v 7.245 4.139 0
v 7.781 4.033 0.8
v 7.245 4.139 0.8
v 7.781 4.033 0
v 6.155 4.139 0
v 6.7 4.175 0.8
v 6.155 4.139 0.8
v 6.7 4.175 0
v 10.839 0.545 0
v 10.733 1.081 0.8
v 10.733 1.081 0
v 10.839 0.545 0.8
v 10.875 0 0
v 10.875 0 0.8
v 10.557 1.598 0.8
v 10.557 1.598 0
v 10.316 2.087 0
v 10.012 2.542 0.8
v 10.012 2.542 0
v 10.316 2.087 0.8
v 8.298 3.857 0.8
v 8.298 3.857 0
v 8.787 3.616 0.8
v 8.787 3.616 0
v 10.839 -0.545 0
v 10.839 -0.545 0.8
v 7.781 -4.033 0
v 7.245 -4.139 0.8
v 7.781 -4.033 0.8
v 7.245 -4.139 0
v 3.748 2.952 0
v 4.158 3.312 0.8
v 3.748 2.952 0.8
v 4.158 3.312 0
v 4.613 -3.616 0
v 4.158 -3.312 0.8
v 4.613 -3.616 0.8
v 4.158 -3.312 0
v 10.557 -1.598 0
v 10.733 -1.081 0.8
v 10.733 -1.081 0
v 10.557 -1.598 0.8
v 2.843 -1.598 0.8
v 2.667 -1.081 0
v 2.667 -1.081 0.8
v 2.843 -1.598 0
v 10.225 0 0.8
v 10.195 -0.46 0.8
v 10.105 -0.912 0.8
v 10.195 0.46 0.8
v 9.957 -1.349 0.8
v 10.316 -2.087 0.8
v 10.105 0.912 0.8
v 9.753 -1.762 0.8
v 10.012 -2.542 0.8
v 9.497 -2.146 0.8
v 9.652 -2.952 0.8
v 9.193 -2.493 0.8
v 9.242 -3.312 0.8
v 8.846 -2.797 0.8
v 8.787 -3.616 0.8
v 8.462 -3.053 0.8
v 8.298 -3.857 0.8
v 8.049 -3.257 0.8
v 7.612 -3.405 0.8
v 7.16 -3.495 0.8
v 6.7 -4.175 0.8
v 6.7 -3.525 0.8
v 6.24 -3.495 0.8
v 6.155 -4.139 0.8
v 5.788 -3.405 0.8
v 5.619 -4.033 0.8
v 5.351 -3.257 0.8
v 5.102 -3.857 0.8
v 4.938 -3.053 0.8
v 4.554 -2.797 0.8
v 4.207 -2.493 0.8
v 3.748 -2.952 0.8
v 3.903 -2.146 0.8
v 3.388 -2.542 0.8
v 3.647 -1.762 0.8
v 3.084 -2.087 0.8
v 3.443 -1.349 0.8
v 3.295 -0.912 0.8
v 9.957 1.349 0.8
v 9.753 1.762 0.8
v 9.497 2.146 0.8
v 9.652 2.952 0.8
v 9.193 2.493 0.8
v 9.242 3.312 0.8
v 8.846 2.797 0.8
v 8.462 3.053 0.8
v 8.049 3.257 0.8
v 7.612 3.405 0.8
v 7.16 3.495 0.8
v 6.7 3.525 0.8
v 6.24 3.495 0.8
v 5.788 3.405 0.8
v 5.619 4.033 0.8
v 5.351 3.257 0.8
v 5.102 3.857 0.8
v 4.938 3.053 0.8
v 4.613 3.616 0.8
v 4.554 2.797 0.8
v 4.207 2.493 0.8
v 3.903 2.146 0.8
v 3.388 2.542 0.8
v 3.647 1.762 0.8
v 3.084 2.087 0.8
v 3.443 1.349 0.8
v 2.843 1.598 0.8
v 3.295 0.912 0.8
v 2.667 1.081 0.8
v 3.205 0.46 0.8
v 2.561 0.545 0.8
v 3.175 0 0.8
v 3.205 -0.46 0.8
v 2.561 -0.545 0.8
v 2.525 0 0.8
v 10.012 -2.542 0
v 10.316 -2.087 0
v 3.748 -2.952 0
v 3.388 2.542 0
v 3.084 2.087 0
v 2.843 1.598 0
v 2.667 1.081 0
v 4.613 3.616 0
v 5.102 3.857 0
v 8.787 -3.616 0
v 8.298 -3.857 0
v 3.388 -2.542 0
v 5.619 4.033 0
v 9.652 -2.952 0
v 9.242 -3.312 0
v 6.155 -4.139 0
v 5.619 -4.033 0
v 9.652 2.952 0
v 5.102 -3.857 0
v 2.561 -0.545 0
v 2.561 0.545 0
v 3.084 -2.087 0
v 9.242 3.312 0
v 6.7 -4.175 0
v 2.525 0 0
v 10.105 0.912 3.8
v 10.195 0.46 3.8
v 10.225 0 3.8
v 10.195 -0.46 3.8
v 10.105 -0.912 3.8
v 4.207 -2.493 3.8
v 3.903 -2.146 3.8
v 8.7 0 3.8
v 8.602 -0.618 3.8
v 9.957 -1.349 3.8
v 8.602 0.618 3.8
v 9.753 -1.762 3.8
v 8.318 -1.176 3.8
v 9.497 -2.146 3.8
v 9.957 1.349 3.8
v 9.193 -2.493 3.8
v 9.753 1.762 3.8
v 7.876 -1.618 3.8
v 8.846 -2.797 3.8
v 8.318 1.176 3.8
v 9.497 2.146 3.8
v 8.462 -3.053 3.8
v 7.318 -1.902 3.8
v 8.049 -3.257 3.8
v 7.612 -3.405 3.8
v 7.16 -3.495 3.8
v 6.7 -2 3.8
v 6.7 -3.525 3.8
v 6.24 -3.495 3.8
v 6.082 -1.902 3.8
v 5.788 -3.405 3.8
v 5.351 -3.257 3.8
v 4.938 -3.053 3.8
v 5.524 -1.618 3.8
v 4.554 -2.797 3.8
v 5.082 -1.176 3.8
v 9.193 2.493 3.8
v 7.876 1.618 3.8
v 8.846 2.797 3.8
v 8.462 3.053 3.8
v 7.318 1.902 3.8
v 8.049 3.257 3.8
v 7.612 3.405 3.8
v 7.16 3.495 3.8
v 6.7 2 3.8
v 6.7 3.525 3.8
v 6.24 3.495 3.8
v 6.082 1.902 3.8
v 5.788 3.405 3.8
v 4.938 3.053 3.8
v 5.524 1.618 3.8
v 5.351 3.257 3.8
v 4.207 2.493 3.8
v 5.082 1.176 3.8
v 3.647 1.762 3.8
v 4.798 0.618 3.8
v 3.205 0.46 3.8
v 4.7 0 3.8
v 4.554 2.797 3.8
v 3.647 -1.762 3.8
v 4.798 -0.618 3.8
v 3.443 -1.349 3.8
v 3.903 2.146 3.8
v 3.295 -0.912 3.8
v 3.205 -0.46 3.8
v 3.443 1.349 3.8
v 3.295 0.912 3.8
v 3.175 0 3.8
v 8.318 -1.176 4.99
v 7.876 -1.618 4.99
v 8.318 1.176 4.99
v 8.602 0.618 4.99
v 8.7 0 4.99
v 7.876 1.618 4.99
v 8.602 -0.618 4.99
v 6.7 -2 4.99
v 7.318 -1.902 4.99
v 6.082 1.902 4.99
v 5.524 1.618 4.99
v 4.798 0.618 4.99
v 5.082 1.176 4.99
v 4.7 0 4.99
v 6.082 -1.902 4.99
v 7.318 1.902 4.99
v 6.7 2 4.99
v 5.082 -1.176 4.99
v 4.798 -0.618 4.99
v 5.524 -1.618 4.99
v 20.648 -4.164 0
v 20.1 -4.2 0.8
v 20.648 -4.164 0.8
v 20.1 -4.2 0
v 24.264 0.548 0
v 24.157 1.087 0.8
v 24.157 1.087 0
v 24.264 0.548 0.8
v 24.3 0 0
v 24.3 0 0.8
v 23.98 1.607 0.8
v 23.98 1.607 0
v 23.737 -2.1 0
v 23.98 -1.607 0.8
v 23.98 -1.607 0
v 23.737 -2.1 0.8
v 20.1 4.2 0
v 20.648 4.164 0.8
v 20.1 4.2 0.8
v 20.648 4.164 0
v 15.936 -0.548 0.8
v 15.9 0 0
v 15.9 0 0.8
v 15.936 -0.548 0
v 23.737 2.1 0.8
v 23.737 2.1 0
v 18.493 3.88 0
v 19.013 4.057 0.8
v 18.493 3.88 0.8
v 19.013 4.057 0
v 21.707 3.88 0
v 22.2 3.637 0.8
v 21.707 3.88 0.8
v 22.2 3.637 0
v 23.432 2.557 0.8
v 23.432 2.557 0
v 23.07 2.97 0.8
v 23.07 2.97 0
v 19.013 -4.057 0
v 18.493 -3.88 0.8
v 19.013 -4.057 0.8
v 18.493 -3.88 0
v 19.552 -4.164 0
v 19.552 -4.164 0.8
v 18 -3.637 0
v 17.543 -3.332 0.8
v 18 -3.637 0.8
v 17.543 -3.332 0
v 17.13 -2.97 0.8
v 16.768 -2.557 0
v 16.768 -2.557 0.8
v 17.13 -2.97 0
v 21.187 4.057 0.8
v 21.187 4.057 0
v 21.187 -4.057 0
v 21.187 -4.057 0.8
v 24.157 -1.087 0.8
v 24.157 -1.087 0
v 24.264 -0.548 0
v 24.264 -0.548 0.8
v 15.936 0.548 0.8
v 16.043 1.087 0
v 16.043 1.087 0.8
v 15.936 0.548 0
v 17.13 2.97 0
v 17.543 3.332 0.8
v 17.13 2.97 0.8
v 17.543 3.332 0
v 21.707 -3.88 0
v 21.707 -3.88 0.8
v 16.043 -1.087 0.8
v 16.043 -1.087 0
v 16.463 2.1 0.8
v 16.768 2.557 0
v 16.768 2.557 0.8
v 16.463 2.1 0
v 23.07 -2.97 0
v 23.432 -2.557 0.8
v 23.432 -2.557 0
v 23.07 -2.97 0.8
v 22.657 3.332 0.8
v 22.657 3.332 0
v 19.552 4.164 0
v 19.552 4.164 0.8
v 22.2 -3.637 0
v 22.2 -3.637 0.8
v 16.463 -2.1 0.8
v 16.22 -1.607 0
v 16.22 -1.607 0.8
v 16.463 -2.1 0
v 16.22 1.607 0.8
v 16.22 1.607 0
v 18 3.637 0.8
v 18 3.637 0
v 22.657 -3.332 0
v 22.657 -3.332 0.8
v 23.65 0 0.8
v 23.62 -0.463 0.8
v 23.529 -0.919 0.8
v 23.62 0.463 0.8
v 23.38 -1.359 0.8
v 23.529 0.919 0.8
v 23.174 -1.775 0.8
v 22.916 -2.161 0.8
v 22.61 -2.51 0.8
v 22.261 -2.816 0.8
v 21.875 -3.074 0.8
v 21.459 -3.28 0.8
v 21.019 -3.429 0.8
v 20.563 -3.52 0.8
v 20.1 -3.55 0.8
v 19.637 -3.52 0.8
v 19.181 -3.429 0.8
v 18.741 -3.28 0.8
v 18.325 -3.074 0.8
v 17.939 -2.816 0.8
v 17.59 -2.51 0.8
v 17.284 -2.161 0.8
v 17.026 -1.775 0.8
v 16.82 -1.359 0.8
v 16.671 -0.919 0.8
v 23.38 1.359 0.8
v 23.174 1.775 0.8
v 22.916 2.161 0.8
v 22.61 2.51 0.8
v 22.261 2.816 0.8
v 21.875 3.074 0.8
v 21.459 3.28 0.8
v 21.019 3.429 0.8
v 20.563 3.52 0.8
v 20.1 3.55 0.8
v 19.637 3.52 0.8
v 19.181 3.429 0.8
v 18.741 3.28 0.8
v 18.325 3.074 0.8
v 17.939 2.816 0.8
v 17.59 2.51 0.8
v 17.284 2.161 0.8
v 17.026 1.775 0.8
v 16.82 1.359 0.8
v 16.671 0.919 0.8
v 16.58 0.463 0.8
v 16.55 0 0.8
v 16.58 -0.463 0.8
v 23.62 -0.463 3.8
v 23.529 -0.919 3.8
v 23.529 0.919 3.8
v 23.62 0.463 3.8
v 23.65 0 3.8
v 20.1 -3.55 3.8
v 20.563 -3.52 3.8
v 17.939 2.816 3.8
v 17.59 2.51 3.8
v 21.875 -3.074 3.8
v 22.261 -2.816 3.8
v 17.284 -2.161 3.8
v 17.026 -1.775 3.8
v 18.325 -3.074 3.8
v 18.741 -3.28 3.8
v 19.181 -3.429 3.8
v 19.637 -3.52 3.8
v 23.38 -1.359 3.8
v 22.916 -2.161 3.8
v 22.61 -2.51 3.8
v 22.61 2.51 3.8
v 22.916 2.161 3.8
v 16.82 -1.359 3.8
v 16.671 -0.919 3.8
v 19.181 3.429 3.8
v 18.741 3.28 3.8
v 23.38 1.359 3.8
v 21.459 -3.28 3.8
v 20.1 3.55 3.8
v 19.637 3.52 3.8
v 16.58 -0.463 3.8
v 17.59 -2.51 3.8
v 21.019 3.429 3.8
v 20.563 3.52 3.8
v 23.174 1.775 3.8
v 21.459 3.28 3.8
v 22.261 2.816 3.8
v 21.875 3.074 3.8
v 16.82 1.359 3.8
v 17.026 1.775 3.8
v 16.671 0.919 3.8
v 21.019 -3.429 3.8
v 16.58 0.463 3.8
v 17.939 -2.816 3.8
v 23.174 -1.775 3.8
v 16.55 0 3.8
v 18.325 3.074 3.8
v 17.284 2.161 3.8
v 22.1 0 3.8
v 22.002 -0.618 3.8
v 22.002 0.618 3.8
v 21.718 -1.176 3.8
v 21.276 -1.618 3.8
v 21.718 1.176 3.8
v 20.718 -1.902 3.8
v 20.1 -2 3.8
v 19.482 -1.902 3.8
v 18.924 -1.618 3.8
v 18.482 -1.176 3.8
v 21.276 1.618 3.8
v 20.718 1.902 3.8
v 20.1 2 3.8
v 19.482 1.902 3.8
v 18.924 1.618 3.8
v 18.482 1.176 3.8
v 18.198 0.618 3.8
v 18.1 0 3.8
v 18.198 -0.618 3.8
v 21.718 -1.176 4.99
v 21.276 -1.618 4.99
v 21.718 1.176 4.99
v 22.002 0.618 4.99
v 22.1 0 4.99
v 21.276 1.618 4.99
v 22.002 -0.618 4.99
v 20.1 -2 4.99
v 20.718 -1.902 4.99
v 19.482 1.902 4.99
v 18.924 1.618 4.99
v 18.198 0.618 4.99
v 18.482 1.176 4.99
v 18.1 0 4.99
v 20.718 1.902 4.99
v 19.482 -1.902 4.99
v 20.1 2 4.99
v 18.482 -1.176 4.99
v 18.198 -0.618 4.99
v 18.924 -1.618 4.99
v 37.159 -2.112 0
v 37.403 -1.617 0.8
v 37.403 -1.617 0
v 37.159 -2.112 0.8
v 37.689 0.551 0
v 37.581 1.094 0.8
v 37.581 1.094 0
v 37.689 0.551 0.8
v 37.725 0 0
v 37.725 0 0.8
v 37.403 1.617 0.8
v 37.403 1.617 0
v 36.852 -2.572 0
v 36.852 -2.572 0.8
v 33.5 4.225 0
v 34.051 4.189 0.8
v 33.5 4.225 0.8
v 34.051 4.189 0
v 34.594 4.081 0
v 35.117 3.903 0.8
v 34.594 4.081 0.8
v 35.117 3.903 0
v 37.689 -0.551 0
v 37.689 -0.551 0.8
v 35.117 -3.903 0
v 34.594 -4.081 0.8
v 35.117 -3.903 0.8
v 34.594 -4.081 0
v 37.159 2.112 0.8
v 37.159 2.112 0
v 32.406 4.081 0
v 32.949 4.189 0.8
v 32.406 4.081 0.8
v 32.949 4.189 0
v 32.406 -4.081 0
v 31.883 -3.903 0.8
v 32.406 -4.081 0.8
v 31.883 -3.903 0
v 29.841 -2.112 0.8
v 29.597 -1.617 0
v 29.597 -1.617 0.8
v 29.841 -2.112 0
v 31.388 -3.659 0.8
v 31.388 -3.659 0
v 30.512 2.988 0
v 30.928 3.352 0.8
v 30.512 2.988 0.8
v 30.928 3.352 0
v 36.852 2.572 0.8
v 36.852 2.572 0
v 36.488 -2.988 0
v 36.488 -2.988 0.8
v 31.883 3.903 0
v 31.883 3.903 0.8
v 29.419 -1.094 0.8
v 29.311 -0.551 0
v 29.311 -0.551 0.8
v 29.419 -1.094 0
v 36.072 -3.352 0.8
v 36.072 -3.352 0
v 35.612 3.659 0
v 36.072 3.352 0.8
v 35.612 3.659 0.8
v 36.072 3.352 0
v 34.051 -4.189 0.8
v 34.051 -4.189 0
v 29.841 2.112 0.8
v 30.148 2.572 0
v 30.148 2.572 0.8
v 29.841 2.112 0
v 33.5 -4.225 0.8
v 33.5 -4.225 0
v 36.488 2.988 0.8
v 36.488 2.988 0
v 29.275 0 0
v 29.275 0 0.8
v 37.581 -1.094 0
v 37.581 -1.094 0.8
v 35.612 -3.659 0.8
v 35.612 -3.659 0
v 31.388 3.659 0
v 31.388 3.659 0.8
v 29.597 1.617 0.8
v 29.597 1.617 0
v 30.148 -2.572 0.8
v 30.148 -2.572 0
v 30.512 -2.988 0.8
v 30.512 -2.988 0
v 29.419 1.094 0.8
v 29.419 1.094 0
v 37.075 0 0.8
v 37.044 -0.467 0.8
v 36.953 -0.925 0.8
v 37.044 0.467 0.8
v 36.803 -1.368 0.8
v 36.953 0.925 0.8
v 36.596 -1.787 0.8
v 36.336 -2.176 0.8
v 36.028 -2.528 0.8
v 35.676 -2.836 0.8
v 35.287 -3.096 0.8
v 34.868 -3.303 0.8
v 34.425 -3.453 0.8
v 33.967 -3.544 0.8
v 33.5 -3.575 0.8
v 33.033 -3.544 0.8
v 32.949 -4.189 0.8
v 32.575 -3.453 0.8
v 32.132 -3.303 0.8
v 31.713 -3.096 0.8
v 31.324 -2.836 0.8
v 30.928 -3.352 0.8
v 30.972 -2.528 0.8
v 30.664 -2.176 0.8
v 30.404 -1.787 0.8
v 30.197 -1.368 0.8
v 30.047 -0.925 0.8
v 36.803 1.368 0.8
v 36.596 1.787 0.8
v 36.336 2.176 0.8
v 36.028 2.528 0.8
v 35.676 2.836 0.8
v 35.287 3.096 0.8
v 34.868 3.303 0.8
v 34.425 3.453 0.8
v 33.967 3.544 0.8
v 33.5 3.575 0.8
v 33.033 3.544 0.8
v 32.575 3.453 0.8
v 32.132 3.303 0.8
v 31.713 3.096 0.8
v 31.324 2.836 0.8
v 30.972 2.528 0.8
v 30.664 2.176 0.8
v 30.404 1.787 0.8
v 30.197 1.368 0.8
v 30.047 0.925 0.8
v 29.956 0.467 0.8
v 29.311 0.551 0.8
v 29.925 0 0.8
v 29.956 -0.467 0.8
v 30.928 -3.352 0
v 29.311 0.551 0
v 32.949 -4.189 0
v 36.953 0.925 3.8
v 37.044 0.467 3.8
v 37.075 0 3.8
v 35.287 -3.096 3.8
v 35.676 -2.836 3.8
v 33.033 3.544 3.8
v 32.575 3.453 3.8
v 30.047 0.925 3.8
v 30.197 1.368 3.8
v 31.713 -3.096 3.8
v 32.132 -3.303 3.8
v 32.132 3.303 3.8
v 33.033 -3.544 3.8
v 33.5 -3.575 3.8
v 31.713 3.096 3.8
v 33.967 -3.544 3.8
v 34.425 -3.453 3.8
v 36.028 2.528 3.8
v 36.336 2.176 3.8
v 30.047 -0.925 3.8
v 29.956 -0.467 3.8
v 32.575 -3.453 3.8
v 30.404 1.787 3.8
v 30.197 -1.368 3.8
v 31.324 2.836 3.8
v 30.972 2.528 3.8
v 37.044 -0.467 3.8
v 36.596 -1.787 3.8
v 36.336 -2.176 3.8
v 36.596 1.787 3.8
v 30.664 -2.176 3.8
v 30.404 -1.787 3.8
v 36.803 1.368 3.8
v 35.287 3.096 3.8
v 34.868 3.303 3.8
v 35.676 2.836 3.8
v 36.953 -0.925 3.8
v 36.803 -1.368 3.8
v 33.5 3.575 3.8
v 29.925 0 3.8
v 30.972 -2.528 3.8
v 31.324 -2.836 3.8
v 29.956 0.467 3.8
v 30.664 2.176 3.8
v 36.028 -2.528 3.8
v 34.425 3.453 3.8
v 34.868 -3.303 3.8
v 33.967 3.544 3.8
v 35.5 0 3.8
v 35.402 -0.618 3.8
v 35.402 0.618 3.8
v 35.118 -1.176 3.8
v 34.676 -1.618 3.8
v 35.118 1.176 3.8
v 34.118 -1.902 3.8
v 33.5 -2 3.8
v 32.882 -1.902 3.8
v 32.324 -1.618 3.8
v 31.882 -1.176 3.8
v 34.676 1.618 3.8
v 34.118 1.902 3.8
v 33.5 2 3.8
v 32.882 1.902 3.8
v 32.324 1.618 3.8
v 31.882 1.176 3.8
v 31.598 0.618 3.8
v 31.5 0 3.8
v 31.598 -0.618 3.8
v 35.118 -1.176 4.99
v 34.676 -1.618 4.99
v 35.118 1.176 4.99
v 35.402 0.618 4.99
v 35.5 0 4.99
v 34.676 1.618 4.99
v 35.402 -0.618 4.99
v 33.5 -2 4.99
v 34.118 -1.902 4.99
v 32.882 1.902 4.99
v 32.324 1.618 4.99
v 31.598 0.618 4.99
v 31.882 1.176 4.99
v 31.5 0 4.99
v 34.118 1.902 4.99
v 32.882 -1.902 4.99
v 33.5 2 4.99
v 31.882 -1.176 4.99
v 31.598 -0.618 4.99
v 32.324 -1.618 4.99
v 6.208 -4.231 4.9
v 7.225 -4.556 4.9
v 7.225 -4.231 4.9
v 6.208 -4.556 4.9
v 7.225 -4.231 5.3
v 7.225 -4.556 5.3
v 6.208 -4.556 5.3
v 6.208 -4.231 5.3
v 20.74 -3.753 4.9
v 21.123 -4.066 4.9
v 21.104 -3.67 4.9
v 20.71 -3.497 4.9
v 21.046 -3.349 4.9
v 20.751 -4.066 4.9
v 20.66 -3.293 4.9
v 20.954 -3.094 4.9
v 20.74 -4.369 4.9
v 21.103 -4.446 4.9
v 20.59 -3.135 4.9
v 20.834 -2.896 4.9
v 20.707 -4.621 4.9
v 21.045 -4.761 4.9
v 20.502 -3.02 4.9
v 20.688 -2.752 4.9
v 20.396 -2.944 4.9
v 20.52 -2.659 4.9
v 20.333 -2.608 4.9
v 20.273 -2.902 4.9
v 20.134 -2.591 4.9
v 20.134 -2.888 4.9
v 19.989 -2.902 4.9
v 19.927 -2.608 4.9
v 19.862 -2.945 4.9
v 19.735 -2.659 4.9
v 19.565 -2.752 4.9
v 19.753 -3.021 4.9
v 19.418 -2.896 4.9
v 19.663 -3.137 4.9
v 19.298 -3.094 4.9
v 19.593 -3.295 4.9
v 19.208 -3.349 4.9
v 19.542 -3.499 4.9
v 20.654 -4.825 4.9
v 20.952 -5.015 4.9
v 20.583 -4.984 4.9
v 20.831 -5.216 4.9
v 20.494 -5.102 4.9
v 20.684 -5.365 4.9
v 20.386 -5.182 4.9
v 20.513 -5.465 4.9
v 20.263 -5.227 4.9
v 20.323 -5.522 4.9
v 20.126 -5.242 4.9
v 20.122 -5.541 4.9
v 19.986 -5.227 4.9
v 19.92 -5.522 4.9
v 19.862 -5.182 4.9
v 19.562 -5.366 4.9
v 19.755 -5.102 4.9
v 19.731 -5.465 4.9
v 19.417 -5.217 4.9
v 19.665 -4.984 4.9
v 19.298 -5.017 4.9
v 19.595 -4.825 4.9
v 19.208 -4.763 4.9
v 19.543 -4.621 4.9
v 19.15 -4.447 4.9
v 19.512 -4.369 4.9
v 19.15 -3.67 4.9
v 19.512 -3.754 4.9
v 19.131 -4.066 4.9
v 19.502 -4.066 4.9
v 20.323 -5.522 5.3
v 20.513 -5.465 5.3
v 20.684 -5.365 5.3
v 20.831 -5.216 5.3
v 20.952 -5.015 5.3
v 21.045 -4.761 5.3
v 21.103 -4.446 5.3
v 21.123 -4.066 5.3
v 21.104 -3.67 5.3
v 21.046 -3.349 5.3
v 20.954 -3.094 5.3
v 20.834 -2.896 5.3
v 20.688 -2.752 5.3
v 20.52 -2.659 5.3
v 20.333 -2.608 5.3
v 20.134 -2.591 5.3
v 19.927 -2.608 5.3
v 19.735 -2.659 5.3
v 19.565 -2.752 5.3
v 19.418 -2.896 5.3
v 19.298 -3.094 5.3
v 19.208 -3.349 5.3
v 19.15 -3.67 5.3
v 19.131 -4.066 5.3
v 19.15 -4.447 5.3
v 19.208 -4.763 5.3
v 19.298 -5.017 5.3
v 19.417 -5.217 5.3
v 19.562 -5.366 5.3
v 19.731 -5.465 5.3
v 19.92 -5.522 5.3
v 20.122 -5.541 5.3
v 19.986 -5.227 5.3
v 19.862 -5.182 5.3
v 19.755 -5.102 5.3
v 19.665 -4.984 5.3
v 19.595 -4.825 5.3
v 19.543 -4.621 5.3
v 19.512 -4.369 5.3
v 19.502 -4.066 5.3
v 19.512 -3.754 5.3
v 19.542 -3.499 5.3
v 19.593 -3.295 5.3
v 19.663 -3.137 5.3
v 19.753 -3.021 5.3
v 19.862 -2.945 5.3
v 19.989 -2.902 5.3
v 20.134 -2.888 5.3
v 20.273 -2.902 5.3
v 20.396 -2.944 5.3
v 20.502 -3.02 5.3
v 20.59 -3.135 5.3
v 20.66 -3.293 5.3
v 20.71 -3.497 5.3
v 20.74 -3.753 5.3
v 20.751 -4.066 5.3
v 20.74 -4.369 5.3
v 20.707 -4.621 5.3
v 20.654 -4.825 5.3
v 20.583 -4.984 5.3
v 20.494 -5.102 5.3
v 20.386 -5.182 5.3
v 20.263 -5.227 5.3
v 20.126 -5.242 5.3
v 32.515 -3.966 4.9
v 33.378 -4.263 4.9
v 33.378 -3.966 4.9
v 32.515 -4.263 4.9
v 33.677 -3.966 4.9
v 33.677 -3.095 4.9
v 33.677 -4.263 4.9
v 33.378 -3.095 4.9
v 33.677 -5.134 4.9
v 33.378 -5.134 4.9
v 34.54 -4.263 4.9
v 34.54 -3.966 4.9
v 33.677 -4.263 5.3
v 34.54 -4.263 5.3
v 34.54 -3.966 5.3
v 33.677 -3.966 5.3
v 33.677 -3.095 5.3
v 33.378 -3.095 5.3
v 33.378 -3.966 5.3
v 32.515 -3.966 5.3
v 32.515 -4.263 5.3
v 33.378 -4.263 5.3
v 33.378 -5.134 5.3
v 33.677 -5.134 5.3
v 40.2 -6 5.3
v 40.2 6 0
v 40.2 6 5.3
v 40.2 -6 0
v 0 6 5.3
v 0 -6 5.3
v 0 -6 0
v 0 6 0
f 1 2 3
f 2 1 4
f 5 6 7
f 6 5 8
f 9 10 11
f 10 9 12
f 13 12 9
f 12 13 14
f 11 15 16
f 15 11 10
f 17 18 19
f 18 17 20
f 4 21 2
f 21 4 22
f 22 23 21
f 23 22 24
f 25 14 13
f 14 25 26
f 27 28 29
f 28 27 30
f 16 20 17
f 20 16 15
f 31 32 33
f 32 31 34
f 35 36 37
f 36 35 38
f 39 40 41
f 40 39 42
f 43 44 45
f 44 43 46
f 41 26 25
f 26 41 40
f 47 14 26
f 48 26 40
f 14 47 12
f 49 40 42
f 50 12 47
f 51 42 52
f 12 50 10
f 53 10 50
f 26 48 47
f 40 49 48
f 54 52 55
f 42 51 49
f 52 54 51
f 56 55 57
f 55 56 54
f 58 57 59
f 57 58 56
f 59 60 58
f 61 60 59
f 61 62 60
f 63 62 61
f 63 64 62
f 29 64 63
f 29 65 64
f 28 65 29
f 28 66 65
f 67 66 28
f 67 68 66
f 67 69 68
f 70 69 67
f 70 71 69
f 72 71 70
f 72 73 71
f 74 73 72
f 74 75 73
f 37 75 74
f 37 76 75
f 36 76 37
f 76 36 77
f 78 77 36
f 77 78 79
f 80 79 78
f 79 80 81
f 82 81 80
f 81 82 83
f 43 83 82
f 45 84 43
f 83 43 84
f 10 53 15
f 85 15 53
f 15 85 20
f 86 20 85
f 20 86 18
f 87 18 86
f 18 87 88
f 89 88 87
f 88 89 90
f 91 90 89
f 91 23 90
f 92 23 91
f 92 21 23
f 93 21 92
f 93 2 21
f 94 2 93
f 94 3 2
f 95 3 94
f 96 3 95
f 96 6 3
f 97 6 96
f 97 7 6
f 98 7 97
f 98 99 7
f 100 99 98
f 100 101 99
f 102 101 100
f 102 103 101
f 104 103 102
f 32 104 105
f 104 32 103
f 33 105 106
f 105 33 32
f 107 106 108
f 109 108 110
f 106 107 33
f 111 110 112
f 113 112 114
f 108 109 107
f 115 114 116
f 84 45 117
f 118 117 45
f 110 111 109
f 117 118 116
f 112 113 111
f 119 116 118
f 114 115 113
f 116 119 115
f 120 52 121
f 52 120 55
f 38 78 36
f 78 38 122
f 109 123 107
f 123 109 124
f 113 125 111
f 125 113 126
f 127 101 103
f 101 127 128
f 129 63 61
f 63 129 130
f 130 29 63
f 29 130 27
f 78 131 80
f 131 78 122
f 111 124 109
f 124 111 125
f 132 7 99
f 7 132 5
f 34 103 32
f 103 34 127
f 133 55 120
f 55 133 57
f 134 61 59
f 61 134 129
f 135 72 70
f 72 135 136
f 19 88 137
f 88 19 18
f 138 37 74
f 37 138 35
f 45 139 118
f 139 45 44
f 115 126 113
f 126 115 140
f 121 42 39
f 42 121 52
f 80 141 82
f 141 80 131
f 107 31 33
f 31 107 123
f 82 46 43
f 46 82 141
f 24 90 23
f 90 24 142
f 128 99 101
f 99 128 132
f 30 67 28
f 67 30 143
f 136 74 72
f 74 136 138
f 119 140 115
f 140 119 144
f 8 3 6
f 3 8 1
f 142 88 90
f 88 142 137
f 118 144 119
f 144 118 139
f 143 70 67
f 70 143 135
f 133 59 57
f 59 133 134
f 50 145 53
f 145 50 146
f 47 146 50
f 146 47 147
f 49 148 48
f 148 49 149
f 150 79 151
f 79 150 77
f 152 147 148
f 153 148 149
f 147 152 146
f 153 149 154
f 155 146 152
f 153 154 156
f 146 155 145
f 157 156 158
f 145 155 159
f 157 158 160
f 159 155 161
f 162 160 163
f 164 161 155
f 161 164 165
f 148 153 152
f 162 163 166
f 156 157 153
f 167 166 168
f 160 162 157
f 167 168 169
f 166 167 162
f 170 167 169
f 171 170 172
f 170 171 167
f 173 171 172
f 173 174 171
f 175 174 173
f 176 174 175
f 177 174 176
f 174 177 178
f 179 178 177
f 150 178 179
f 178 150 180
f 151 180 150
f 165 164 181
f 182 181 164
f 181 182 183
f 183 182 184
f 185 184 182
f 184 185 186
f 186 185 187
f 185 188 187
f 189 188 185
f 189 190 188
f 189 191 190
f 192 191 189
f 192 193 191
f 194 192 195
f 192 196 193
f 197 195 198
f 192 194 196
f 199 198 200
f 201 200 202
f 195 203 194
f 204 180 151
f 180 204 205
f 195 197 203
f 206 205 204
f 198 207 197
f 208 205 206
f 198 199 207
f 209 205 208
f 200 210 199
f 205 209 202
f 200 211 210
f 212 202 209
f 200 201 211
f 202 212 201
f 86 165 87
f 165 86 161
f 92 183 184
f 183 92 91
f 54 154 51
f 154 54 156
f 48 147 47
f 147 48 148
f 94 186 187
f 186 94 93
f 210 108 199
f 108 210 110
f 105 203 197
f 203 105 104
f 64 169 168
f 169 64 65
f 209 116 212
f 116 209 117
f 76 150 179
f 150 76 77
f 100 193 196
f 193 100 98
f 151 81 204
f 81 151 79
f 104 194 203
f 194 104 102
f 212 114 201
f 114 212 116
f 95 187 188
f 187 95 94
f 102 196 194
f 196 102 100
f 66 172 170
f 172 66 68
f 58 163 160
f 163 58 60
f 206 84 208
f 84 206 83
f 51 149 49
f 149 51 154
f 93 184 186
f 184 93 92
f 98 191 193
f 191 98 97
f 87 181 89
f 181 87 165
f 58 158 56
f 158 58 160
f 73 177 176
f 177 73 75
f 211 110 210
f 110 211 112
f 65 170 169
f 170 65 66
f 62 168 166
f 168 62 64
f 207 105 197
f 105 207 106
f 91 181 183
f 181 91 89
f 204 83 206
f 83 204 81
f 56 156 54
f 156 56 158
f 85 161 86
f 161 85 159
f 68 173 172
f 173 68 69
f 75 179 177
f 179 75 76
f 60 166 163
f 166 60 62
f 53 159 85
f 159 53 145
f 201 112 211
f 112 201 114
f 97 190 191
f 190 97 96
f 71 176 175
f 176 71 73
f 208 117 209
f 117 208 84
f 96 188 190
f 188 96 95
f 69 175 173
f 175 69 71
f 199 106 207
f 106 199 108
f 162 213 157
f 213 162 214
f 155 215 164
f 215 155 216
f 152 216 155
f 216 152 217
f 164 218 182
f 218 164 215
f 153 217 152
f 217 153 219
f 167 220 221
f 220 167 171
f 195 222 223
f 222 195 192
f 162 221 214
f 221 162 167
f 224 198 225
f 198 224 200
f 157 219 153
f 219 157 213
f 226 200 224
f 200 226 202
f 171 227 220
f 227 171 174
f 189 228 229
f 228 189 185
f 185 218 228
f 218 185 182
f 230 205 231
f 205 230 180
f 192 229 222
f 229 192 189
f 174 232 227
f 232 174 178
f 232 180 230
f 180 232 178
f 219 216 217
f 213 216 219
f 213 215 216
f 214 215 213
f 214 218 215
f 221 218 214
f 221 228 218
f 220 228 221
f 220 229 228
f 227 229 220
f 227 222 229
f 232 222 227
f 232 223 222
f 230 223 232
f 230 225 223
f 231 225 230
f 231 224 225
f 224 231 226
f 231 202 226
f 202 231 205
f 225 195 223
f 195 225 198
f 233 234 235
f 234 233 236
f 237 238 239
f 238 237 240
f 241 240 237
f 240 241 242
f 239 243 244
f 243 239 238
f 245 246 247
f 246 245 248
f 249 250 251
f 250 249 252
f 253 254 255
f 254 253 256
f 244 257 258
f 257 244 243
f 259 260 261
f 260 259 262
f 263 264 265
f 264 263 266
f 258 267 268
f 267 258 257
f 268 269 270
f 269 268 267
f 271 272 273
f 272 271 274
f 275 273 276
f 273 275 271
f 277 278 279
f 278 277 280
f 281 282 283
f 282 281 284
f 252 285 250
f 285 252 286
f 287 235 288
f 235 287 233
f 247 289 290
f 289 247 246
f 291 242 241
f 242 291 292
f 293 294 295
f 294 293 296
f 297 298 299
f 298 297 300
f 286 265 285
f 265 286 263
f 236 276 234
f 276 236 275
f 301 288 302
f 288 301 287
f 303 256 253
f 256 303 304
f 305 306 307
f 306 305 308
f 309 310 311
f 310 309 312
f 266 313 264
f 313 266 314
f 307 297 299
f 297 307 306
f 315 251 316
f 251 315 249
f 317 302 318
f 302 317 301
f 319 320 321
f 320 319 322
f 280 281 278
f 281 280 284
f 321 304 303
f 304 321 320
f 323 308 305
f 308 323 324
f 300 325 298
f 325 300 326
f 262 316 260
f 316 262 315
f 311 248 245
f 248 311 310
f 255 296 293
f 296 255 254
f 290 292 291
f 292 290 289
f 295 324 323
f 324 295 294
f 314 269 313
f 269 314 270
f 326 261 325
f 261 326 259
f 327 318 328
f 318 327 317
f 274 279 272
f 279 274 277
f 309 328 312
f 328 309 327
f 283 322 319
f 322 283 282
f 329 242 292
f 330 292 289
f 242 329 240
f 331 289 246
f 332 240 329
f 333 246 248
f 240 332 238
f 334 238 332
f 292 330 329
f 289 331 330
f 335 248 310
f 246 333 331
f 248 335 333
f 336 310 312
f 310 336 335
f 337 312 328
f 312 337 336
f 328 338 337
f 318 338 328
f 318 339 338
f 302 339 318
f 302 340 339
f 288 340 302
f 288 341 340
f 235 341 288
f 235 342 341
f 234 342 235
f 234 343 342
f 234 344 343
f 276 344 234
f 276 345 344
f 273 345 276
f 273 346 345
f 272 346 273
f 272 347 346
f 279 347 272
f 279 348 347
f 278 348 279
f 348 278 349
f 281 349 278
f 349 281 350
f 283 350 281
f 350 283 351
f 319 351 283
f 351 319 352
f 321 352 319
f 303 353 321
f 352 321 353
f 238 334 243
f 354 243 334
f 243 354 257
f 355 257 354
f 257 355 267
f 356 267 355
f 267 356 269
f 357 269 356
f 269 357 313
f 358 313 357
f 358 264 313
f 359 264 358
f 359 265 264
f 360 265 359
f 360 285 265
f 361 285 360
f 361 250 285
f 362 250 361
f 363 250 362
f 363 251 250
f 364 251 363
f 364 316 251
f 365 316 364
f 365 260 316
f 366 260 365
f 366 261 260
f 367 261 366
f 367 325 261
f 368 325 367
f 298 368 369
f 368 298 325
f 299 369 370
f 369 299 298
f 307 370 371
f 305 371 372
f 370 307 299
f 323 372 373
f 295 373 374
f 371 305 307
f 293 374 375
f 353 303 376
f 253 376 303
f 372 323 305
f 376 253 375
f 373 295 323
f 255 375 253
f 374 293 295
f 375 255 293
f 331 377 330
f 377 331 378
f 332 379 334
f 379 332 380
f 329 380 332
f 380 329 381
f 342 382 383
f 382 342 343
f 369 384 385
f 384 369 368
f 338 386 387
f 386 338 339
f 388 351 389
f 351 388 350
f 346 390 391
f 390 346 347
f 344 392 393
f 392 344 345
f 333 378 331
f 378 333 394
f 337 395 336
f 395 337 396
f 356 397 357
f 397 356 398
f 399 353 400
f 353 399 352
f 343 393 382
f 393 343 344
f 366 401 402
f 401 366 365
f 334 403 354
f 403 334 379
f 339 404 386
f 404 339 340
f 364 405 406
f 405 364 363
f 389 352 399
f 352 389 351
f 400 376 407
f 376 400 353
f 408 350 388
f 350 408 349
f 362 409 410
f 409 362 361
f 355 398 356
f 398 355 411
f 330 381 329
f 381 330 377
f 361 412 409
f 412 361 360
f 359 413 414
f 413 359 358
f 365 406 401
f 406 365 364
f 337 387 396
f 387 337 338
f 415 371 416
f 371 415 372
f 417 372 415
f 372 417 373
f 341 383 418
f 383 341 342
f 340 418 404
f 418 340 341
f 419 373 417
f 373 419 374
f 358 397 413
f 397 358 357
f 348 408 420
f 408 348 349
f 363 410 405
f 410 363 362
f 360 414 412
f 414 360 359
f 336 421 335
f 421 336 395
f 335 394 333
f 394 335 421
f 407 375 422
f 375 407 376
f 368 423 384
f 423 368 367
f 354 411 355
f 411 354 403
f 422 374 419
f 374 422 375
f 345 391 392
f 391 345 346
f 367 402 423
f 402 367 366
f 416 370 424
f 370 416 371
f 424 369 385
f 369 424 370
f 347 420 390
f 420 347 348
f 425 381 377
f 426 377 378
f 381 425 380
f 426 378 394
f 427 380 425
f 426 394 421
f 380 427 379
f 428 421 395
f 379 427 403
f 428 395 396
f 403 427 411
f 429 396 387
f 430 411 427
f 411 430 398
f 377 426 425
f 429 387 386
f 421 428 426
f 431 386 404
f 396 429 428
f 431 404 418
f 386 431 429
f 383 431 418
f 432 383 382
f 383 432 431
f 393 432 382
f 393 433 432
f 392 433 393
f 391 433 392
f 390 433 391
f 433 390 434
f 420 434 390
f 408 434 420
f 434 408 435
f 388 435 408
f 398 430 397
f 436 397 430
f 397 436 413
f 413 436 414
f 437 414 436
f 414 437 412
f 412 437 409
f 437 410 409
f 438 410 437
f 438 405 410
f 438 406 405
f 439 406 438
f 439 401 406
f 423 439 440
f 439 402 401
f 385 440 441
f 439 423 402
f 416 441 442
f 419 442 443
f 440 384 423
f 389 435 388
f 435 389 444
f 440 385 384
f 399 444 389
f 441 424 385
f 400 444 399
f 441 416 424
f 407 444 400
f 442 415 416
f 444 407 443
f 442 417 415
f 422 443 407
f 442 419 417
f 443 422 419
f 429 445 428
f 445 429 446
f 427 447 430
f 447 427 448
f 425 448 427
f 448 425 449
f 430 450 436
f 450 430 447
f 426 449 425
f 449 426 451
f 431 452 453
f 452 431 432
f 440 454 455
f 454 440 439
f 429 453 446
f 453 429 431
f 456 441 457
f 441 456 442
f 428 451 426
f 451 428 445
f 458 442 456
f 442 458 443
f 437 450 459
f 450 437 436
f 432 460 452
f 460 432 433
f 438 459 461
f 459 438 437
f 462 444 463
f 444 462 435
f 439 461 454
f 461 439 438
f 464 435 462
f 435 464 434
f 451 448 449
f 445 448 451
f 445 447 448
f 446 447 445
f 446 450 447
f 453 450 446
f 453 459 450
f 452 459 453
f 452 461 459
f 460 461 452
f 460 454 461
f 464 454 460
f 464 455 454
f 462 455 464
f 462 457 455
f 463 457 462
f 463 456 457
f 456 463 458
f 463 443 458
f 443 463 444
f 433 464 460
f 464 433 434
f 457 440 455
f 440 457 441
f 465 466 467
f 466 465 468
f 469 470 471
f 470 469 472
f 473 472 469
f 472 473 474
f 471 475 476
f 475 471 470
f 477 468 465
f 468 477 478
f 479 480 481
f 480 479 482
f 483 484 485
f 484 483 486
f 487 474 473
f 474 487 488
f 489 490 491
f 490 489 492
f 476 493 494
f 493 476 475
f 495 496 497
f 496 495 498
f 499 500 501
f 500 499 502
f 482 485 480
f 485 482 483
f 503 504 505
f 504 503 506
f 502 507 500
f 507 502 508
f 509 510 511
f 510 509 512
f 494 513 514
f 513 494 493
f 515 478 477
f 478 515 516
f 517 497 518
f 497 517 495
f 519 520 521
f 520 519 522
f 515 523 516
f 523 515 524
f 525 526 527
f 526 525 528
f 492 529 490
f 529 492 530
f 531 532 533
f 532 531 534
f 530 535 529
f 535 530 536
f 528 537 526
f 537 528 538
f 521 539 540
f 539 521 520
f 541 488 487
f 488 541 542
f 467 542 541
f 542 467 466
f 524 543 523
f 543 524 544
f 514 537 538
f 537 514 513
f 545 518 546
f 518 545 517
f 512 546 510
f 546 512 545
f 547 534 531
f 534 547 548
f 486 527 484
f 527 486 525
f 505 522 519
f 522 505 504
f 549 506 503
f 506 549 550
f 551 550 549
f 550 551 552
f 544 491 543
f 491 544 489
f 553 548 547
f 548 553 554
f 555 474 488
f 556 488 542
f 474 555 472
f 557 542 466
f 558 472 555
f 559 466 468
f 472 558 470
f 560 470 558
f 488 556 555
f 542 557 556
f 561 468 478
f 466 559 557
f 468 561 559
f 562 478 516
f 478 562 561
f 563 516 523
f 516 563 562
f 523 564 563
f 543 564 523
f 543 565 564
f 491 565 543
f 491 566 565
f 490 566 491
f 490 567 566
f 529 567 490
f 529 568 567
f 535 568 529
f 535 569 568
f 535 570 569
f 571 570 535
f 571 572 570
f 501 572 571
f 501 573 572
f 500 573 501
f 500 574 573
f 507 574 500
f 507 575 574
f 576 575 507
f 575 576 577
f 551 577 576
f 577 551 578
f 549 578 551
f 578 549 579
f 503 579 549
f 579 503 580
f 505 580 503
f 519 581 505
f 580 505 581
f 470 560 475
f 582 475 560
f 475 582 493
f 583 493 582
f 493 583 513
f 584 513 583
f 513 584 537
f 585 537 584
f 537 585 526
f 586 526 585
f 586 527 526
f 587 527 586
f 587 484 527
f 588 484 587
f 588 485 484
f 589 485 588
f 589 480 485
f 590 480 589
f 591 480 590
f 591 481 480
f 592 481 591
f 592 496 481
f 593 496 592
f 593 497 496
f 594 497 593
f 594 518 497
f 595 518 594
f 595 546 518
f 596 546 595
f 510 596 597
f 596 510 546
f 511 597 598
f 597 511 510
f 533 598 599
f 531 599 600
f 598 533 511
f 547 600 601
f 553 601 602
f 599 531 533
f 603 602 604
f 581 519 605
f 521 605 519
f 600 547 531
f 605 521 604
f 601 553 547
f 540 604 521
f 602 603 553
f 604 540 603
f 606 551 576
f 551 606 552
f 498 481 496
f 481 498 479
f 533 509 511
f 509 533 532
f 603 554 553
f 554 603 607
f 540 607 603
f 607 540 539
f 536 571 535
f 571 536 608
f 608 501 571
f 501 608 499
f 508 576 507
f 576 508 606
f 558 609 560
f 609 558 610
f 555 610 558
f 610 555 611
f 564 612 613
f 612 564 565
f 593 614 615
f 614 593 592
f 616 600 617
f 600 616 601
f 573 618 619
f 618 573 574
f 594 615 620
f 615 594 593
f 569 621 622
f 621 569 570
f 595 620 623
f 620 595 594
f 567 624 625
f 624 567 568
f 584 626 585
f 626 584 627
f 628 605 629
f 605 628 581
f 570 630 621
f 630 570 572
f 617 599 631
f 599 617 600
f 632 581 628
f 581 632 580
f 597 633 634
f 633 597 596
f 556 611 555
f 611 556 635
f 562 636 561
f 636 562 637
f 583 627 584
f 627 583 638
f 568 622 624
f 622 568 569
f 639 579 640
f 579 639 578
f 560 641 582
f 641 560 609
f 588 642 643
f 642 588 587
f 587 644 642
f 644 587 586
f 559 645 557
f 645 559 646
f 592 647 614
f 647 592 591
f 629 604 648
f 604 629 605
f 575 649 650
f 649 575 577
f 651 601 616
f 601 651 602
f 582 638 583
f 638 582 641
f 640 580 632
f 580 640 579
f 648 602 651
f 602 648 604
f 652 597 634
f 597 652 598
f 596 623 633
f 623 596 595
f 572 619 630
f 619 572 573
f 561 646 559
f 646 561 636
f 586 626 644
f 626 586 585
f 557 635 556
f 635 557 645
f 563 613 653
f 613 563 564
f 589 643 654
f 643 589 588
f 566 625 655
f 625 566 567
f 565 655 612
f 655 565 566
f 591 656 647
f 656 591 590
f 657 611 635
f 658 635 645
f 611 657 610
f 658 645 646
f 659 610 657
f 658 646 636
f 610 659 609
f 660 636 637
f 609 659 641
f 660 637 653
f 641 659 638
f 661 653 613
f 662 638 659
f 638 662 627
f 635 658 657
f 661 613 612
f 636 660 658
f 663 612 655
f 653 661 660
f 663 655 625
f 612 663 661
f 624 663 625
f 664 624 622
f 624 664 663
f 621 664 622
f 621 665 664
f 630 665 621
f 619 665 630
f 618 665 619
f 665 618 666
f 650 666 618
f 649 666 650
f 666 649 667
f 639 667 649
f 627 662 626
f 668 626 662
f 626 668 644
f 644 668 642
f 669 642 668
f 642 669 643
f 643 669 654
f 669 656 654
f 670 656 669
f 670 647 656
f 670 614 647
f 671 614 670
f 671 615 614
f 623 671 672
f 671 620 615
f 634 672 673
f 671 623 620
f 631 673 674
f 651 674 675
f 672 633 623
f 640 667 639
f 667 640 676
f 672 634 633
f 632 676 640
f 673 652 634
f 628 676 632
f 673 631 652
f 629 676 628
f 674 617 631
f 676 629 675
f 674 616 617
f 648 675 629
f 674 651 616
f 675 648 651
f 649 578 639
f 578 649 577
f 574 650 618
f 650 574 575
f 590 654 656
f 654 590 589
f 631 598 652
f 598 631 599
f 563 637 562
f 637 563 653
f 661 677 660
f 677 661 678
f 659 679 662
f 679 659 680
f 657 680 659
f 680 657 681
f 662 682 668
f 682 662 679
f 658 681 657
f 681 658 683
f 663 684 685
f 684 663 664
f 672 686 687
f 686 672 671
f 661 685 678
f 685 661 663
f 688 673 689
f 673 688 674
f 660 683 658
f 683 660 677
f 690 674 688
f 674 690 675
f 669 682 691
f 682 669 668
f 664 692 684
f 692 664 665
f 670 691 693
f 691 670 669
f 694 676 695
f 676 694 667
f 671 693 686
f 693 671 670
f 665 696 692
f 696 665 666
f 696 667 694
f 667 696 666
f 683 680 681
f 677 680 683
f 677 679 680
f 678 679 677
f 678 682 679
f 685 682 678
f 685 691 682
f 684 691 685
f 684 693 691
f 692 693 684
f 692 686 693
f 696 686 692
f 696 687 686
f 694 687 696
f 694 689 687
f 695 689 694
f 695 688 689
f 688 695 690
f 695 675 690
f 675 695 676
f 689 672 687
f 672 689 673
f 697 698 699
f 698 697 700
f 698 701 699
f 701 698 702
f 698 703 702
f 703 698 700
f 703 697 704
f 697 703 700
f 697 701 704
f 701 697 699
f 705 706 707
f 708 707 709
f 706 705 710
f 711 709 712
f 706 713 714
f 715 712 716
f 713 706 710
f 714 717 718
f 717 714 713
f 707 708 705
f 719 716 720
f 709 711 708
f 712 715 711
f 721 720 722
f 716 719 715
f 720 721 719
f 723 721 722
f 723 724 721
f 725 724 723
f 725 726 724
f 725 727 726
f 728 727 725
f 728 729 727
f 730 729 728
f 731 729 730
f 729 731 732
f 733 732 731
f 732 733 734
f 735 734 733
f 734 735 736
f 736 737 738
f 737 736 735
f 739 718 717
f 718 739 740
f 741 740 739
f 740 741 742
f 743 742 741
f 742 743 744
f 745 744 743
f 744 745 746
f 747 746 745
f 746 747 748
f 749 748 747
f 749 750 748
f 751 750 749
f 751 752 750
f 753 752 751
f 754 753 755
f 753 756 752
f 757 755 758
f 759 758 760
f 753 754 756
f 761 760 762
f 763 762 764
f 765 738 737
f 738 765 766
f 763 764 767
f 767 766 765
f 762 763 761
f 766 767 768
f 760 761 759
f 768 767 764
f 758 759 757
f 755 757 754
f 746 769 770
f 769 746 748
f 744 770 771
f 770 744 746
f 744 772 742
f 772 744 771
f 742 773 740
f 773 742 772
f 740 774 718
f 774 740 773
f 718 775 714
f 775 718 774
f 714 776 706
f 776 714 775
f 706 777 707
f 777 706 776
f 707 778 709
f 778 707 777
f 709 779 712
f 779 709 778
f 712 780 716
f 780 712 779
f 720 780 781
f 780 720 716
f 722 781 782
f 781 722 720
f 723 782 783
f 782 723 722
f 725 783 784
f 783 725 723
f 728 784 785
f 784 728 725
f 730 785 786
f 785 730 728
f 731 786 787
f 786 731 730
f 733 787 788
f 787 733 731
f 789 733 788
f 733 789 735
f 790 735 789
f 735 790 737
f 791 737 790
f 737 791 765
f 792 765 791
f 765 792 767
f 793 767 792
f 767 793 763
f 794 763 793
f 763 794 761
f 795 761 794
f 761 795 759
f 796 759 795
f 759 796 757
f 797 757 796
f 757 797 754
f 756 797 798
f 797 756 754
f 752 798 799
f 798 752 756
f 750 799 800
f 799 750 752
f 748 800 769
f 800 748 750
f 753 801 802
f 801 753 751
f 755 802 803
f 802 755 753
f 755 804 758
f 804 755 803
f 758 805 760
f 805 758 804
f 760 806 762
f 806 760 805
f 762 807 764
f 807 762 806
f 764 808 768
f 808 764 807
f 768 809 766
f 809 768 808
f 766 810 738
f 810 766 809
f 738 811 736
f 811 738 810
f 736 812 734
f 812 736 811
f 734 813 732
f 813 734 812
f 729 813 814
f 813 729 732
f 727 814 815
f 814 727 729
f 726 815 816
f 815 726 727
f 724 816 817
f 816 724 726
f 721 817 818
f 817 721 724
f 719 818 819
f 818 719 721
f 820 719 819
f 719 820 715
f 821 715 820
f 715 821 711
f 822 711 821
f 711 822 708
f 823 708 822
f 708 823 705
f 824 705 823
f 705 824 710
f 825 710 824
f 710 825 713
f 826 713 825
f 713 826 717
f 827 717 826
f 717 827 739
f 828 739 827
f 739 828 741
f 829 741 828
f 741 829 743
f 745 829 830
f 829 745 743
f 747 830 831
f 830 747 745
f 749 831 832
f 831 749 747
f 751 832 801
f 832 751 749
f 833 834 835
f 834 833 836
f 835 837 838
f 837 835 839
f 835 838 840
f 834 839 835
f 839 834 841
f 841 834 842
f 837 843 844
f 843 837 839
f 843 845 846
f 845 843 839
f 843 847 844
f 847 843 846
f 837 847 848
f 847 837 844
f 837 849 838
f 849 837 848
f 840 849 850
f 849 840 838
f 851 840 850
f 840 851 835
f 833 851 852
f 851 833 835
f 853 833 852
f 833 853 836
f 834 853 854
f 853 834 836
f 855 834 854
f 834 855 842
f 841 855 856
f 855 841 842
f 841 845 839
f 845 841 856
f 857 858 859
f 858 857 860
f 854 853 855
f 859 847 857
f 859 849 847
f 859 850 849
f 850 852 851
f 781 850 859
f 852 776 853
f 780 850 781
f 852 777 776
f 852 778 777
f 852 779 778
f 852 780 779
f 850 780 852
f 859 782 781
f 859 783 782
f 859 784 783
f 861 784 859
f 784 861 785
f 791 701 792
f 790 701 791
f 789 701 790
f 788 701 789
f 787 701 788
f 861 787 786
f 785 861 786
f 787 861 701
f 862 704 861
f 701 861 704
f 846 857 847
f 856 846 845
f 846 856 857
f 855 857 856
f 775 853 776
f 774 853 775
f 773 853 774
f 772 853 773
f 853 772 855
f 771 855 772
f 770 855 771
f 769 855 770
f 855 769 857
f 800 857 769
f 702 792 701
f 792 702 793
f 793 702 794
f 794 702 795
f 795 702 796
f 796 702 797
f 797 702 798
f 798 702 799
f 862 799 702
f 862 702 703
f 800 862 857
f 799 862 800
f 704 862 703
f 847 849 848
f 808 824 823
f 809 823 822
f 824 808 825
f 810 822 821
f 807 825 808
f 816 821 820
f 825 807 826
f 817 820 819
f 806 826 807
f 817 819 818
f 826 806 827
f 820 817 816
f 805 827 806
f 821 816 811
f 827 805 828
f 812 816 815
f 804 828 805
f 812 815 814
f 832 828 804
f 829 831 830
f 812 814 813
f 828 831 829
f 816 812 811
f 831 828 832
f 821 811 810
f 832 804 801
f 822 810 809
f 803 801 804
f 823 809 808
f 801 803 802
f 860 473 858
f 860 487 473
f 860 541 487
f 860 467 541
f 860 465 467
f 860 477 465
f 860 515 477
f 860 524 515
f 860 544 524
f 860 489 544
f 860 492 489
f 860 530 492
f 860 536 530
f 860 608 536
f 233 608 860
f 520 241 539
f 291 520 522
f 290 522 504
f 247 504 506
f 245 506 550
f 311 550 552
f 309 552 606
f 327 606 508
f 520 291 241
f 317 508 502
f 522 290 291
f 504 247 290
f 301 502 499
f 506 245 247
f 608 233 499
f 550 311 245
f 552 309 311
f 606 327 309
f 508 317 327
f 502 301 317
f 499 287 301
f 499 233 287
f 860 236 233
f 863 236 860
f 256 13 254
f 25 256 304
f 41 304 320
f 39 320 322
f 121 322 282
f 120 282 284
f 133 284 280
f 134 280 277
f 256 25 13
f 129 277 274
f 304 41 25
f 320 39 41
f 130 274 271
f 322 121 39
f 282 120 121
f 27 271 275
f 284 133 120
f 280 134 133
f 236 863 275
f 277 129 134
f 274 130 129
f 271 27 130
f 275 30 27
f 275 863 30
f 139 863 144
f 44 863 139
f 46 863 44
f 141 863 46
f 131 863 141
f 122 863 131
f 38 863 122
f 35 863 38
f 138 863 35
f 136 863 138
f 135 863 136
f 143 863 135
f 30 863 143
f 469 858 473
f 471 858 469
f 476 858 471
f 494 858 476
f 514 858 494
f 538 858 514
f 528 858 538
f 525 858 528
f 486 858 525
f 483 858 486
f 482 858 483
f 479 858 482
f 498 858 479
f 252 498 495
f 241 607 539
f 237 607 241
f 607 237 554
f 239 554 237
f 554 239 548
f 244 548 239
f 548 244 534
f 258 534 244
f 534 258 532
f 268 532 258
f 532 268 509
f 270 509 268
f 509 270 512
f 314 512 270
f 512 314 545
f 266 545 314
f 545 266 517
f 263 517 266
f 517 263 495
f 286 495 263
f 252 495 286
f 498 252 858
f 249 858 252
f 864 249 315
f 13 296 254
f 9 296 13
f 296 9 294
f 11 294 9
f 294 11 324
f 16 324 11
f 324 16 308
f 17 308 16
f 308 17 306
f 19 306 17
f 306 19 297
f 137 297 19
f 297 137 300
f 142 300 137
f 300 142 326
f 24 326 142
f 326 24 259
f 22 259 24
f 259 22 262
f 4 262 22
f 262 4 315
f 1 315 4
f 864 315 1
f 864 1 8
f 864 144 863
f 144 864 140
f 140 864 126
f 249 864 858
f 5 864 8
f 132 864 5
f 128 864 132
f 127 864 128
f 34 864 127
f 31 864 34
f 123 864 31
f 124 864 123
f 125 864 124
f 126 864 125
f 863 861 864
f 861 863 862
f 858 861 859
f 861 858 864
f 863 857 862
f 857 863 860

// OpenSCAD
// Milwaukee Road Little Joe, G scale 1-29 - print 20 of 20: bearing_coupon - bearing fit test - print first
// Render (F6), export STL, print. Settings: ../../library/lj_params.scad
// Whole loco preview and notes: ../../MILW_LittleJoe_Main.scad
SCALE_SEL = "G";
LOCO_SEL = "E70";   // [E20, E21, E70, E71, E72, E73, E74, E75, E76, E77, E78, E79] the body and roof change for E20 / E21
include <../../library/lj_all.scad>
lj_plate("bearing_coupon");
